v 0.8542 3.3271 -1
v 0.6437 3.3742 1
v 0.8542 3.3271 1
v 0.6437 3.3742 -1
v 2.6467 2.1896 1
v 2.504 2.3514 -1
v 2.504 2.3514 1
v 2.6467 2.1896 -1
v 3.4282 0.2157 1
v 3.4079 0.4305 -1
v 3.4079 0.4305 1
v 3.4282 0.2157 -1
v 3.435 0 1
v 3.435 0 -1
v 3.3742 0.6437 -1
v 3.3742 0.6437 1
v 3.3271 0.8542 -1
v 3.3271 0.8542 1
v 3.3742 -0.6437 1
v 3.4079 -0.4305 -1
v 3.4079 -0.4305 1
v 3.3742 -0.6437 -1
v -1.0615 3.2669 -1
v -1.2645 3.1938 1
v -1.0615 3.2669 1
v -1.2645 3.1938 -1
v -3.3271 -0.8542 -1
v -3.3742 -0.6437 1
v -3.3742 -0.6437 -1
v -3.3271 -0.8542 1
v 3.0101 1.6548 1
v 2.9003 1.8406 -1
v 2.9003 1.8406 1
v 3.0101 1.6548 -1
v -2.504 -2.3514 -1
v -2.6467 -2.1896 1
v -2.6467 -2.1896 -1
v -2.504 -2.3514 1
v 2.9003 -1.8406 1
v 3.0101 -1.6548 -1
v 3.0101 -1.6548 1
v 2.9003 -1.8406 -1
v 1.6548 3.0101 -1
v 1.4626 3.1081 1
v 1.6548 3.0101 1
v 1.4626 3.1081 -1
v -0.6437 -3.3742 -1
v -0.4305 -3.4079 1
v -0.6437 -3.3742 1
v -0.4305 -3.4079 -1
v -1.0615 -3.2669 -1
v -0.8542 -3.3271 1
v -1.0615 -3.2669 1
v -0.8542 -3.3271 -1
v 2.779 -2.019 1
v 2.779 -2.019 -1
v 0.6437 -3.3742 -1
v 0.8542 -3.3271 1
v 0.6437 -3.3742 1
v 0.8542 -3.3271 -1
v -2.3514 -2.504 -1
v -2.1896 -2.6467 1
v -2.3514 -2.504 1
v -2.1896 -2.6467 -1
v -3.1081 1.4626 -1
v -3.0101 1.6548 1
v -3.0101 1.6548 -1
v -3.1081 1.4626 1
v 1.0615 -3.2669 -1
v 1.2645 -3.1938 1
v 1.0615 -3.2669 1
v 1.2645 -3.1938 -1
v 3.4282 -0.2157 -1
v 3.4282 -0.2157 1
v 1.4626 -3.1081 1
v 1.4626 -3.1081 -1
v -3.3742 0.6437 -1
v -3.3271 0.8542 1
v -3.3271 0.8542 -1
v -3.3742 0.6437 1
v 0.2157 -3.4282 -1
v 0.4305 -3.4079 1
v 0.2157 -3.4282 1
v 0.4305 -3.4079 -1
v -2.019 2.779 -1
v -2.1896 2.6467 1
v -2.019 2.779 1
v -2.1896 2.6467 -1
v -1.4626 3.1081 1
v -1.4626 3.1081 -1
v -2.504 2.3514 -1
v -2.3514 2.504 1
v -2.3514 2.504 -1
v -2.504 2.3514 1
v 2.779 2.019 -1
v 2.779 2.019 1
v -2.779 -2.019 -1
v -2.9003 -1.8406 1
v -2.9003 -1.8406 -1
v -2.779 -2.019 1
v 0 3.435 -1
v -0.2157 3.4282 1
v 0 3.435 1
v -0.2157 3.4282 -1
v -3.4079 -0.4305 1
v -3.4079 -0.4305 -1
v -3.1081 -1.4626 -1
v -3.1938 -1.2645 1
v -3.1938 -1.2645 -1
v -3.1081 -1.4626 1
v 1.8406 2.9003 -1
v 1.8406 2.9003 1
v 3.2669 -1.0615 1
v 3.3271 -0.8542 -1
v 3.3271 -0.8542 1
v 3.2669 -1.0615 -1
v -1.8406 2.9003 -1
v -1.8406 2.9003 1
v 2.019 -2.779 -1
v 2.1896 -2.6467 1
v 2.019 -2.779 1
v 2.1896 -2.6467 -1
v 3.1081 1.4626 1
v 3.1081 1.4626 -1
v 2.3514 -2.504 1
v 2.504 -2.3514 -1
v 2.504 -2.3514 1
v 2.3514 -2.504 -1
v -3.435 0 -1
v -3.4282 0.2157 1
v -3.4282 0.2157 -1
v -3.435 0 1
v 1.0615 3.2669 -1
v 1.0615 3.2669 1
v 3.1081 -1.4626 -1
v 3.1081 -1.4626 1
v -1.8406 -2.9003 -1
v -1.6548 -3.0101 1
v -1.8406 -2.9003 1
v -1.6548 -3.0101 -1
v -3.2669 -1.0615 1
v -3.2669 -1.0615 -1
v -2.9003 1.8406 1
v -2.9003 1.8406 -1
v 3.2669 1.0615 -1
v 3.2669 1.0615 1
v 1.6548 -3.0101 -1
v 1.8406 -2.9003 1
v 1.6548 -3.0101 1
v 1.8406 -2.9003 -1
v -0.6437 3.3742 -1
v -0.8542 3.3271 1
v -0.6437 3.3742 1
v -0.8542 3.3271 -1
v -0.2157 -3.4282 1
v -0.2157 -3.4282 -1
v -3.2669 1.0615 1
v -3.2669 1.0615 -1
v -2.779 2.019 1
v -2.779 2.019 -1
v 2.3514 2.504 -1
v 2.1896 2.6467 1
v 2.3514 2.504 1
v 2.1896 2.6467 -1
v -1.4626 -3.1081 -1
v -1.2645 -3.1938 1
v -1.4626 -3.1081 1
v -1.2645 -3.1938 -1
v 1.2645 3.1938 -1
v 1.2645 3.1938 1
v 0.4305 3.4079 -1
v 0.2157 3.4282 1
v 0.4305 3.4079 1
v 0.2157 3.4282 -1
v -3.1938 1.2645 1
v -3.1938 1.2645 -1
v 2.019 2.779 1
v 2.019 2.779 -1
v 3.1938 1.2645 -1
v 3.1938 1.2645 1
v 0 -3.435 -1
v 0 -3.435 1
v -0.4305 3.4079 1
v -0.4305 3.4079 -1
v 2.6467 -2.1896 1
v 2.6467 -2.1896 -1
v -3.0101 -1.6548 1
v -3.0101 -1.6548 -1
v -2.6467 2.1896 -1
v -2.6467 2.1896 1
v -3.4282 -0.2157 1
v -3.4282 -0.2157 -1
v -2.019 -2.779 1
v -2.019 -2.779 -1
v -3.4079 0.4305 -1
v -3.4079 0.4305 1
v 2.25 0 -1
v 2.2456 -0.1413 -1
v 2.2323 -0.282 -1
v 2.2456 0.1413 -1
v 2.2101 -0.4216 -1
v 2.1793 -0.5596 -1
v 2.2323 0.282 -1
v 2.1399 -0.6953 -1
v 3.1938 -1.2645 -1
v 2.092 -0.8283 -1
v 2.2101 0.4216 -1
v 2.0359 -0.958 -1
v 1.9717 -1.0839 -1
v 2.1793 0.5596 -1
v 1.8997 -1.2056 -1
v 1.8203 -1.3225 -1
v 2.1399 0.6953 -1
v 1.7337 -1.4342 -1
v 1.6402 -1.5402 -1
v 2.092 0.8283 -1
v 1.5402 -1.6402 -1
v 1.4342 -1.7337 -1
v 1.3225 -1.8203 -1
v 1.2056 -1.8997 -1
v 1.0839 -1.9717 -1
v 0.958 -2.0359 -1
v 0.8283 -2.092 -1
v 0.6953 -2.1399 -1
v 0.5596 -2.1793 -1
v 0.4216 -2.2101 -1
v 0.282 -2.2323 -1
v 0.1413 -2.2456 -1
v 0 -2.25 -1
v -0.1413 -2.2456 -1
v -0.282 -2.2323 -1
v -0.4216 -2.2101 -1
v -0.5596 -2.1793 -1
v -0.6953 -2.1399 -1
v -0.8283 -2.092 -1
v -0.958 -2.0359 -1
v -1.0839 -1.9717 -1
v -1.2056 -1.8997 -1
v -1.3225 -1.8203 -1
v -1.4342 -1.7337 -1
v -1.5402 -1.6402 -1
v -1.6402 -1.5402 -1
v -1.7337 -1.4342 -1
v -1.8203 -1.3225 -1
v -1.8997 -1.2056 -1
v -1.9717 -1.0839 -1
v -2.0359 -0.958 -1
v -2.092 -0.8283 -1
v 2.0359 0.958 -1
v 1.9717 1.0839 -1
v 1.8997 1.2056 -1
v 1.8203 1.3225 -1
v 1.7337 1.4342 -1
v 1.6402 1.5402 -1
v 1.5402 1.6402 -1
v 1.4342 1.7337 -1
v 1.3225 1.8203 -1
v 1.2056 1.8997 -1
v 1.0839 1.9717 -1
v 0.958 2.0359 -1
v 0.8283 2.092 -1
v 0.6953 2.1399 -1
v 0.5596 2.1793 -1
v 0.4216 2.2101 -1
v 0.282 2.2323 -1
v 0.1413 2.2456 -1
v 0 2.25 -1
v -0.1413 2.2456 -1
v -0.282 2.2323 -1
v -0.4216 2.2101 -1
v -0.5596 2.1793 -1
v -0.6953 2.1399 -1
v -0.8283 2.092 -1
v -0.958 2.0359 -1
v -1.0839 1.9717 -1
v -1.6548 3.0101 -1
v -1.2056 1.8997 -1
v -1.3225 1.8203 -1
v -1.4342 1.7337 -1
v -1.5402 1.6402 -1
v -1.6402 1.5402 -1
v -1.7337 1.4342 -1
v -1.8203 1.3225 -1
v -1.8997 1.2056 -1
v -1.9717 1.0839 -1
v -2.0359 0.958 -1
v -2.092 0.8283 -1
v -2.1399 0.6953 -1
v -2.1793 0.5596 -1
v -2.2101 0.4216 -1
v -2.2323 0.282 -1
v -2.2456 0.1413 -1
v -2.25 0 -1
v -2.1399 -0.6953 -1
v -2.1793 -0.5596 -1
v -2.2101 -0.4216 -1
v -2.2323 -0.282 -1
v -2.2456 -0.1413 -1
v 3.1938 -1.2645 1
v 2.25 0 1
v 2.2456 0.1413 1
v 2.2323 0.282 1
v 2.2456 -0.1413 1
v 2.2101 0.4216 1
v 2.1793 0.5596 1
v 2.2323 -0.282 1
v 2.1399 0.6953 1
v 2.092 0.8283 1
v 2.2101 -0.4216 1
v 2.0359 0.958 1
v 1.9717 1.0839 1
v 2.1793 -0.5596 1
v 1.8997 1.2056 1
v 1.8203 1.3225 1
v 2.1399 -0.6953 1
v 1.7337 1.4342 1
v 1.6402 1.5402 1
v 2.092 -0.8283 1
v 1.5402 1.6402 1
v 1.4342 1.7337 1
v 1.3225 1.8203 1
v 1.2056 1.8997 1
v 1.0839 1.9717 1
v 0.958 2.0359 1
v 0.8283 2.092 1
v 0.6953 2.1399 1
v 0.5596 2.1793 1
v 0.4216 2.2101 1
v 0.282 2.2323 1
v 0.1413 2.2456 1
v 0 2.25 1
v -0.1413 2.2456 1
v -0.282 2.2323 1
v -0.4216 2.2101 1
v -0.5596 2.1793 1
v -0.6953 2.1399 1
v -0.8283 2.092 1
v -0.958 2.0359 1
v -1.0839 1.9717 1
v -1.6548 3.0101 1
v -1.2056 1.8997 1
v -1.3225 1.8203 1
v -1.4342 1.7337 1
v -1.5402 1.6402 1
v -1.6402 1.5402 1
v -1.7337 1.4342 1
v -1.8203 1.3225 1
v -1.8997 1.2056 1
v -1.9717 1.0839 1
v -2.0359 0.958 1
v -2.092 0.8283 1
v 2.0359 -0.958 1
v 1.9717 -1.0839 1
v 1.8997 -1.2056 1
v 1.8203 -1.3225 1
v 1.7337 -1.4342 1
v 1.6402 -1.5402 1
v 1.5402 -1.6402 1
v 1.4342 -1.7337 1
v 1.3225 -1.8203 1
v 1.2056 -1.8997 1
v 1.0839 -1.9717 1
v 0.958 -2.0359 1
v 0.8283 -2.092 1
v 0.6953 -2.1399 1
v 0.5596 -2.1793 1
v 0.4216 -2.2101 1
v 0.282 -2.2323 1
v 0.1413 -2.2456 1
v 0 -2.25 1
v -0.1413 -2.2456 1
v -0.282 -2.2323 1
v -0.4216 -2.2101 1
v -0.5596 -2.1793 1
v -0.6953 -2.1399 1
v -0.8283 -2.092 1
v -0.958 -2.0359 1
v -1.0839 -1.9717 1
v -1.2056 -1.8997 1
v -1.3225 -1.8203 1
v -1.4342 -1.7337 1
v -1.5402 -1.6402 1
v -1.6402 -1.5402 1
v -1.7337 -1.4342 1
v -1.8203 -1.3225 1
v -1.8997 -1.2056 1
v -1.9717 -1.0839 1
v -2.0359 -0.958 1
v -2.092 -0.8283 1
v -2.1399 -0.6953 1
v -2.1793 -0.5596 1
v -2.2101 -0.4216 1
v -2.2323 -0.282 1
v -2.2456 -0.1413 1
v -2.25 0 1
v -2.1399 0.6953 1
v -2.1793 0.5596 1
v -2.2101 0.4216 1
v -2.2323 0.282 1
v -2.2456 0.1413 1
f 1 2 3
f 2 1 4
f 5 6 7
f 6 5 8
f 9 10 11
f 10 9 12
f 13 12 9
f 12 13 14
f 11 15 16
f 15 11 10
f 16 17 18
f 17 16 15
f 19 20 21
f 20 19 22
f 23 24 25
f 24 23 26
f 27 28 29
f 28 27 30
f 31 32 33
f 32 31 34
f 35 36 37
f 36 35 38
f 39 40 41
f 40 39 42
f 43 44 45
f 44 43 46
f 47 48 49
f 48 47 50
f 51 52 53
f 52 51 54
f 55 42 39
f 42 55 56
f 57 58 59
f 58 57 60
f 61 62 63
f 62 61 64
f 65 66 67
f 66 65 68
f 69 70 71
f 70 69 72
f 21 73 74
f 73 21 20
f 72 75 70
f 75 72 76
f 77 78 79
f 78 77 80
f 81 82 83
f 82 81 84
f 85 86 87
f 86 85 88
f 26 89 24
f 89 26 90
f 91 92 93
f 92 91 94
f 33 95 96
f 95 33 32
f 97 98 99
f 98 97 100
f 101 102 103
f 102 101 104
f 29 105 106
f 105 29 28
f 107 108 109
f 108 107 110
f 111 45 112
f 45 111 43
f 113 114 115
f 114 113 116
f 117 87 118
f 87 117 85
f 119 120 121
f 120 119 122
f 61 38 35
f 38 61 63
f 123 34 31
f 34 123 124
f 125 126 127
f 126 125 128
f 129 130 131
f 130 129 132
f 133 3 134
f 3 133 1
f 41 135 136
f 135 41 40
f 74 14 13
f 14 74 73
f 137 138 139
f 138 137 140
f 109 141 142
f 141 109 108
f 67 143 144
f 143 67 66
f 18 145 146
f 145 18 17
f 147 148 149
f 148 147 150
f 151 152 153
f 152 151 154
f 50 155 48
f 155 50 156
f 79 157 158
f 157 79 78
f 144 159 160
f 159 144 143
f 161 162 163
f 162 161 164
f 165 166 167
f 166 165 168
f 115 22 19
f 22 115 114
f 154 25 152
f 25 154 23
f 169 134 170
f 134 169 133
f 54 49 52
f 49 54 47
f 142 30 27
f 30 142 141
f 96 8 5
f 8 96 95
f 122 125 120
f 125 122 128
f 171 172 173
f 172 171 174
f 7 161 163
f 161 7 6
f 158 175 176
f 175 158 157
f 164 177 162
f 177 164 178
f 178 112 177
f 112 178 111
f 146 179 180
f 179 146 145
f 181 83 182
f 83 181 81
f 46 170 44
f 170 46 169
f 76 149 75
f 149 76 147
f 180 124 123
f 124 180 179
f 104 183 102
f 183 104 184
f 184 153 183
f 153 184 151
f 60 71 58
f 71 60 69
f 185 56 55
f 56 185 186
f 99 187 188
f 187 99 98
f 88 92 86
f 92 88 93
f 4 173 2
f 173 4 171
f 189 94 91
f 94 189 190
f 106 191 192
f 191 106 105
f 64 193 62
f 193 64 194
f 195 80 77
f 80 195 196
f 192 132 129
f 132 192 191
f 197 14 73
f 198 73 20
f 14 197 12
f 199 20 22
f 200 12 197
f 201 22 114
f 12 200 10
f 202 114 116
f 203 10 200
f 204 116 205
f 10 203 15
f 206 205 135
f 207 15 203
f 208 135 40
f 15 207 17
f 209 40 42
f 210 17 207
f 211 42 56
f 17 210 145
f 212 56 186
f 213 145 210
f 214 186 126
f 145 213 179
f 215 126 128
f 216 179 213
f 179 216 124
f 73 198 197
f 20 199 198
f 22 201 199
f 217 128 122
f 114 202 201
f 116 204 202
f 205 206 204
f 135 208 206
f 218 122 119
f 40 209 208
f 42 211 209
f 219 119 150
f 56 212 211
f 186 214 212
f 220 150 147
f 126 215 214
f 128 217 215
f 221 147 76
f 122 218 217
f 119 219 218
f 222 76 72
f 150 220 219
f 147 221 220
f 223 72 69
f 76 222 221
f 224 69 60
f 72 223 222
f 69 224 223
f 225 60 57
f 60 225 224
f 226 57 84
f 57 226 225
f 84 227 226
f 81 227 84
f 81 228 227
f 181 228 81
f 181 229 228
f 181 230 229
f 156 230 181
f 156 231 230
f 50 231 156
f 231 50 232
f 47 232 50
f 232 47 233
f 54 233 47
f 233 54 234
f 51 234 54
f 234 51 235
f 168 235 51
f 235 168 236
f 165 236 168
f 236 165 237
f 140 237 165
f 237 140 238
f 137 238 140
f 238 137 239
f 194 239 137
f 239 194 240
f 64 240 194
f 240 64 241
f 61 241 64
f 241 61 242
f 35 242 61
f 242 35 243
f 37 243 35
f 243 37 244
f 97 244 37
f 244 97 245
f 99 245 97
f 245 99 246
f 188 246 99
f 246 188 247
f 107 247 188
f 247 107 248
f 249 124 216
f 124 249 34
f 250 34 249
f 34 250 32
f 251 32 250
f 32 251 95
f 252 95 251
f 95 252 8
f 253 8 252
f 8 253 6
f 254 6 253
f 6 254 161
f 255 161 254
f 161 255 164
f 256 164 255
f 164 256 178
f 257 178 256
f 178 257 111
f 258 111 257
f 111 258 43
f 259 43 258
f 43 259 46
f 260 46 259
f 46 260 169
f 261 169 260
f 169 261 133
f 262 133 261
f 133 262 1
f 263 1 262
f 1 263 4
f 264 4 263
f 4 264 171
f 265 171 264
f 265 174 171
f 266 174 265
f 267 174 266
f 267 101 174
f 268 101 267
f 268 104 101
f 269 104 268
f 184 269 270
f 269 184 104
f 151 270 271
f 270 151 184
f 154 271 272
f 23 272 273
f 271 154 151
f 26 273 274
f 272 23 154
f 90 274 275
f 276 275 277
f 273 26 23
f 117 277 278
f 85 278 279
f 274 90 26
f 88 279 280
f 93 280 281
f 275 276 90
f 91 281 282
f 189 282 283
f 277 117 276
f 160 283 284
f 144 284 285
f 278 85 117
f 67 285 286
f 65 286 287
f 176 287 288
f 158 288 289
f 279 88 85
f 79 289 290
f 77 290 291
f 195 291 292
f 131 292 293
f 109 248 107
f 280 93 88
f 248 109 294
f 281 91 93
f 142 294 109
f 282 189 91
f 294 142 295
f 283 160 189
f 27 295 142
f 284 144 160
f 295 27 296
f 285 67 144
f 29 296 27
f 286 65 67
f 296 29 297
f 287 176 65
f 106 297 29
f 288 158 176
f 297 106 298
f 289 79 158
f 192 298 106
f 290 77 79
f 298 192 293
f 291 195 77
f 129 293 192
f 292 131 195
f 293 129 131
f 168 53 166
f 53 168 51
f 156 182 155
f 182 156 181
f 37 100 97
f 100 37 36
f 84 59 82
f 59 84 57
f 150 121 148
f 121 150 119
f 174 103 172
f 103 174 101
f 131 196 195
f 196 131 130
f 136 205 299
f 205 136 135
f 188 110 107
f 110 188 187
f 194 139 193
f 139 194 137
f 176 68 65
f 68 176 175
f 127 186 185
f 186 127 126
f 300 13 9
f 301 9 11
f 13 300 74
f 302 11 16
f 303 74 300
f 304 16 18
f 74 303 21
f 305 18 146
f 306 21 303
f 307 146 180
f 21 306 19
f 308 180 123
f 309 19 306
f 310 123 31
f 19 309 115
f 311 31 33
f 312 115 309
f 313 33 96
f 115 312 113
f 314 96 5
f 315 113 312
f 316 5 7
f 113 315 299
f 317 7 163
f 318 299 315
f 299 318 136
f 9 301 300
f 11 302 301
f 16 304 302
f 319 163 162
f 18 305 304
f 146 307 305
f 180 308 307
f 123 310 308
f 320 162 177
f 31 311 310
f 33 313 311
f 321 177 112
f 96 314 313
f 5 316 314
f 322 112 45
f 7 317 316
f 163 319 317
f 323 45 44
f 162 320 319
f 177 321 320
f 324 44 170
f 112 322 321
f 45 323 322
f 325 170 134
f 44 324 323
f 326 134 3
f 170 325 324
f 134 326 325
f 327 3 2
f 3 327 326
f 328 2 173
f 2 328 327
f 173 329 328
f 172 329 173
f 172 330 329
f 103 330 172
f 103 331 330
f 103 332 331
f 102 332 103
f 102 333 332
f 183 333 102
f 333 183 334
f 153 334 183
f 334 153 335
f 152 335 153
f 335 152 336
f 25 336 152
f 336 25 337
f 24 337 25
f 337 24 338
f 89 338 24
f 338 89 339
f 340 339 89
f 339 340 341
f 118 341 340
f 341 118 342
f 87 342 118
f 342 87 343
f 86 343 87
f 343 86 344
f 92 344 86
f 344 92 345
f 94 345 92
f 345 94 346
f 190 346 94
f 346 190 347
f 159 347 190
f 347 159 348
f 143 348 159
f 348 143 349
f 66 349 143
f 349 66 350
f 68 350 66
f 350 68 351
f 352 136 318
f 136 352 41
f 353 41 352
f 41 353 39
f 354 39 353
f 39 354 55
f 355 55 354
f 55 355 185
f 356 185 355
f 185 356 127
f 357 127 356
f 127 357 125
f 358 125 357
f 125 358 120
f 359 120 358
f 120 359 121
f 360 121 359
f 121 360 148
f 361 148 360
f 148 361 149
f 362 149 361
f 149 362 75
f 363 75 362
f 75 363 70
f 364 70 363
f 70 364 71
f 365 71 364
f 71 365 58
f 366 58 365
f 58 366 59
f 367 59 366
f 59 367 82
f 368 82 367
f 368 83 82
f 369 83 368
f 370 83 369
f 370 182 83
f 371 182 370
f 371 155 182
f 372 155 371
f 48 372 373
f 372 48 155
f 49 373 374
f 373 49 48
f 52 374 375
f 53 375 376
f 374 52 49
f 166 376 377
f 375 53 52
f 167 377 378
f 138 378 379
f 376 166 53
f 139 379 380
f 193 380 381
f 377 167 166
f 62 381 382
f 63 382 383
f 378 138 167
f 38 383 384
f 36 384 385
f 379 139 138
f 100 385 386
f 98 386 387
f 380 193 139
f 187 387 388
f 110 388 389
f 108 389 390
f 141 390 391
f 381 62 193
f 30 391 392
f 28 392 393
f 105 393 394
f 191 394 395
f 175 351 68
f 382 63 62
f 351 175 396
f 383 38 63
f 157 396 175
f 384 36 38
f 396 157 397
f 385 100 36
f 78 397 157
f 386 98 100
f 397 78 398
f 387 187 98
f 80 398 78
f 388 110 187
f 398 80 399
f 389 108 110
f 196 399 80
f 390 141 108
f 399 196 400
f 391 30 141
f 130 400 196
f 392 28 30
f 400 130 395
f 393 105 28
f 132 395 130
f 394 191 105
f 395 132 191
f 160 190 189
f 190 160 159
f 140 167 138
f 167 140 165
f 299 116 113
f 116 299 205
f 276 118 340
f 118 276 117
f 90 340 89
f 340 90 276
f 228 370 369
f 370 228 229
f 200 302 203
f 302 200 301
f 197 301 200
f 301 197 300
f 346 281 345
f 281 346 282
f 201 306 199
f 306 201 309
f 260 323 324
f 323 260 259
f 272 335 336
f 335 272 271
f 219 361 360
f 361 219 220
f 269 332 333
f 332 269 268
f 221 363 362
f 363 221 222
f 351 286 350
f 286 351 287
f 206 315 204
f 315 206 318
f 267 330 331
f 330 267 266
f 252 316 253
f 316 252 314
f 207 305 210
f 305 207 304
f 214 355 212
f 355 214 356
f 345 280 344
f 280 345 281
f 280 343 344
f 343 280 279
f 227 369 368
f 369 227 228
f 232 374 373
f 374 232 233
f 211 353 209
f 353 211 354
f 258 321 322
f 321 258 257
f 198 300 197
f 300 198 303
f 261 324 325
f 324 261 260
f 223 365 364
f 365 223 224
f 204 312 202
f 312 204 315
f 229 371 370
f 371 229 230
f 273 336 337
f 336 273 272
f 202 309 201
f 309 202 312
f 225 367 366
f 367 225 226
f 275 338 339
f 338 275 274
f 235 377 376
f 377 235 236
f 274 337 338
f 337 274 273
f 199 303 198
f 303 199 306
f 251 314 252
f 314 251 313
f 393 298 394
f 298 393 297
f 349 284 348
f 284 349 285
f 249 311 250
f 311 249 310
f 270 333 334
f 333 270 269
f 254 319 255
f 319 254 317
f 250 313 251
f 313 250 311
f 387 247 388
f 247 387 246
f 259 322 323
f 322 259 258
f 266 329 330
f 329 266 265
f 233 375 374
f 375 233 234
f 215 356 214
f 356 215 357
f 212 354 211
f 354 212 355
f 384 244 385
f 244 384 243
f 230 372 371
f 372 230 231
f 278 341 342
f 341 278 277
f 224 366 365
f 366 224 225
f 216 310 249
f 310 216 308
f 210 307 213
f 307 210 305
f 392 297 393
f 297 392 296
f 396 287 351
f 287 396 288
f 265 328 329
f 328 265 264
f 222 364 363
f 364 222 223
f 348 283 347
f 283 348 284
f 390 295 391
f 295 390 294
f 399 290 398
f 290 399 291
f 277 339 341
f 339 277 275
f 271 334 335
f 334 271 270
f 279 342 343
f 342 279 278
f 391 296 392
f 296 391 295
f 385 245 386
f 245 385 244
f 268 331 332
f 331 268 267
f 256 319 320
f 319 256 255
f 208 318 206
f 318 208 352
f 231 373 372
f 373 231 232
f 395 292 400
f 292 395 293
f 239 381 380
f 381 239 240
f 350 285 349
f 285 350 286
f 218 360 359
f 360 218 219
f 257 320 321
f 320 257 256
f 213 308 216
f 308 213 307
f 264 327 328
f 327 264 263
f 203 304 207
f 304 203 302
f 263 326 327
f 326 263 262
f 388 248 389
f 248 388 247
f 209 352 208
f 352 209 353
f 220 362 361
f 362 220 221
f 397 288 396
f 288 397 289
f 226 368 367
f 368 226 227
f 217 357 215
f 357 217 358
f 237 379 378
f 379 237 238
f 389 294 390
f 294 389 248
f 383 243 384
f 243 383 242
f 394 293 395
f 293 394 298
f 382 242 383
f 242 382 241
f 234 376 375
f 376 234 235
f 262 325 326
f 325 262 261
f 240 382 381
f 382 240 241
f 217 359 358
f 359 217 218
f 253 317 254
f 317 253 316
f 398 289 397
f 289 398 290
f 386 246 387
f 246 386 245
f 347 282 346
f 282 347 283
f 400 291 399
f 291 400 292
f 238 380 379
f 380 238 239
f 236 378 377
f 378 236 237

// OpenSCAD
$fn=100;
D = 6.87;
d = 4.5;
h = 2;

difference(){
  cylinder(d=D, h=h, center=true);
  cylinder(d=d, h+100, center=true);
}
